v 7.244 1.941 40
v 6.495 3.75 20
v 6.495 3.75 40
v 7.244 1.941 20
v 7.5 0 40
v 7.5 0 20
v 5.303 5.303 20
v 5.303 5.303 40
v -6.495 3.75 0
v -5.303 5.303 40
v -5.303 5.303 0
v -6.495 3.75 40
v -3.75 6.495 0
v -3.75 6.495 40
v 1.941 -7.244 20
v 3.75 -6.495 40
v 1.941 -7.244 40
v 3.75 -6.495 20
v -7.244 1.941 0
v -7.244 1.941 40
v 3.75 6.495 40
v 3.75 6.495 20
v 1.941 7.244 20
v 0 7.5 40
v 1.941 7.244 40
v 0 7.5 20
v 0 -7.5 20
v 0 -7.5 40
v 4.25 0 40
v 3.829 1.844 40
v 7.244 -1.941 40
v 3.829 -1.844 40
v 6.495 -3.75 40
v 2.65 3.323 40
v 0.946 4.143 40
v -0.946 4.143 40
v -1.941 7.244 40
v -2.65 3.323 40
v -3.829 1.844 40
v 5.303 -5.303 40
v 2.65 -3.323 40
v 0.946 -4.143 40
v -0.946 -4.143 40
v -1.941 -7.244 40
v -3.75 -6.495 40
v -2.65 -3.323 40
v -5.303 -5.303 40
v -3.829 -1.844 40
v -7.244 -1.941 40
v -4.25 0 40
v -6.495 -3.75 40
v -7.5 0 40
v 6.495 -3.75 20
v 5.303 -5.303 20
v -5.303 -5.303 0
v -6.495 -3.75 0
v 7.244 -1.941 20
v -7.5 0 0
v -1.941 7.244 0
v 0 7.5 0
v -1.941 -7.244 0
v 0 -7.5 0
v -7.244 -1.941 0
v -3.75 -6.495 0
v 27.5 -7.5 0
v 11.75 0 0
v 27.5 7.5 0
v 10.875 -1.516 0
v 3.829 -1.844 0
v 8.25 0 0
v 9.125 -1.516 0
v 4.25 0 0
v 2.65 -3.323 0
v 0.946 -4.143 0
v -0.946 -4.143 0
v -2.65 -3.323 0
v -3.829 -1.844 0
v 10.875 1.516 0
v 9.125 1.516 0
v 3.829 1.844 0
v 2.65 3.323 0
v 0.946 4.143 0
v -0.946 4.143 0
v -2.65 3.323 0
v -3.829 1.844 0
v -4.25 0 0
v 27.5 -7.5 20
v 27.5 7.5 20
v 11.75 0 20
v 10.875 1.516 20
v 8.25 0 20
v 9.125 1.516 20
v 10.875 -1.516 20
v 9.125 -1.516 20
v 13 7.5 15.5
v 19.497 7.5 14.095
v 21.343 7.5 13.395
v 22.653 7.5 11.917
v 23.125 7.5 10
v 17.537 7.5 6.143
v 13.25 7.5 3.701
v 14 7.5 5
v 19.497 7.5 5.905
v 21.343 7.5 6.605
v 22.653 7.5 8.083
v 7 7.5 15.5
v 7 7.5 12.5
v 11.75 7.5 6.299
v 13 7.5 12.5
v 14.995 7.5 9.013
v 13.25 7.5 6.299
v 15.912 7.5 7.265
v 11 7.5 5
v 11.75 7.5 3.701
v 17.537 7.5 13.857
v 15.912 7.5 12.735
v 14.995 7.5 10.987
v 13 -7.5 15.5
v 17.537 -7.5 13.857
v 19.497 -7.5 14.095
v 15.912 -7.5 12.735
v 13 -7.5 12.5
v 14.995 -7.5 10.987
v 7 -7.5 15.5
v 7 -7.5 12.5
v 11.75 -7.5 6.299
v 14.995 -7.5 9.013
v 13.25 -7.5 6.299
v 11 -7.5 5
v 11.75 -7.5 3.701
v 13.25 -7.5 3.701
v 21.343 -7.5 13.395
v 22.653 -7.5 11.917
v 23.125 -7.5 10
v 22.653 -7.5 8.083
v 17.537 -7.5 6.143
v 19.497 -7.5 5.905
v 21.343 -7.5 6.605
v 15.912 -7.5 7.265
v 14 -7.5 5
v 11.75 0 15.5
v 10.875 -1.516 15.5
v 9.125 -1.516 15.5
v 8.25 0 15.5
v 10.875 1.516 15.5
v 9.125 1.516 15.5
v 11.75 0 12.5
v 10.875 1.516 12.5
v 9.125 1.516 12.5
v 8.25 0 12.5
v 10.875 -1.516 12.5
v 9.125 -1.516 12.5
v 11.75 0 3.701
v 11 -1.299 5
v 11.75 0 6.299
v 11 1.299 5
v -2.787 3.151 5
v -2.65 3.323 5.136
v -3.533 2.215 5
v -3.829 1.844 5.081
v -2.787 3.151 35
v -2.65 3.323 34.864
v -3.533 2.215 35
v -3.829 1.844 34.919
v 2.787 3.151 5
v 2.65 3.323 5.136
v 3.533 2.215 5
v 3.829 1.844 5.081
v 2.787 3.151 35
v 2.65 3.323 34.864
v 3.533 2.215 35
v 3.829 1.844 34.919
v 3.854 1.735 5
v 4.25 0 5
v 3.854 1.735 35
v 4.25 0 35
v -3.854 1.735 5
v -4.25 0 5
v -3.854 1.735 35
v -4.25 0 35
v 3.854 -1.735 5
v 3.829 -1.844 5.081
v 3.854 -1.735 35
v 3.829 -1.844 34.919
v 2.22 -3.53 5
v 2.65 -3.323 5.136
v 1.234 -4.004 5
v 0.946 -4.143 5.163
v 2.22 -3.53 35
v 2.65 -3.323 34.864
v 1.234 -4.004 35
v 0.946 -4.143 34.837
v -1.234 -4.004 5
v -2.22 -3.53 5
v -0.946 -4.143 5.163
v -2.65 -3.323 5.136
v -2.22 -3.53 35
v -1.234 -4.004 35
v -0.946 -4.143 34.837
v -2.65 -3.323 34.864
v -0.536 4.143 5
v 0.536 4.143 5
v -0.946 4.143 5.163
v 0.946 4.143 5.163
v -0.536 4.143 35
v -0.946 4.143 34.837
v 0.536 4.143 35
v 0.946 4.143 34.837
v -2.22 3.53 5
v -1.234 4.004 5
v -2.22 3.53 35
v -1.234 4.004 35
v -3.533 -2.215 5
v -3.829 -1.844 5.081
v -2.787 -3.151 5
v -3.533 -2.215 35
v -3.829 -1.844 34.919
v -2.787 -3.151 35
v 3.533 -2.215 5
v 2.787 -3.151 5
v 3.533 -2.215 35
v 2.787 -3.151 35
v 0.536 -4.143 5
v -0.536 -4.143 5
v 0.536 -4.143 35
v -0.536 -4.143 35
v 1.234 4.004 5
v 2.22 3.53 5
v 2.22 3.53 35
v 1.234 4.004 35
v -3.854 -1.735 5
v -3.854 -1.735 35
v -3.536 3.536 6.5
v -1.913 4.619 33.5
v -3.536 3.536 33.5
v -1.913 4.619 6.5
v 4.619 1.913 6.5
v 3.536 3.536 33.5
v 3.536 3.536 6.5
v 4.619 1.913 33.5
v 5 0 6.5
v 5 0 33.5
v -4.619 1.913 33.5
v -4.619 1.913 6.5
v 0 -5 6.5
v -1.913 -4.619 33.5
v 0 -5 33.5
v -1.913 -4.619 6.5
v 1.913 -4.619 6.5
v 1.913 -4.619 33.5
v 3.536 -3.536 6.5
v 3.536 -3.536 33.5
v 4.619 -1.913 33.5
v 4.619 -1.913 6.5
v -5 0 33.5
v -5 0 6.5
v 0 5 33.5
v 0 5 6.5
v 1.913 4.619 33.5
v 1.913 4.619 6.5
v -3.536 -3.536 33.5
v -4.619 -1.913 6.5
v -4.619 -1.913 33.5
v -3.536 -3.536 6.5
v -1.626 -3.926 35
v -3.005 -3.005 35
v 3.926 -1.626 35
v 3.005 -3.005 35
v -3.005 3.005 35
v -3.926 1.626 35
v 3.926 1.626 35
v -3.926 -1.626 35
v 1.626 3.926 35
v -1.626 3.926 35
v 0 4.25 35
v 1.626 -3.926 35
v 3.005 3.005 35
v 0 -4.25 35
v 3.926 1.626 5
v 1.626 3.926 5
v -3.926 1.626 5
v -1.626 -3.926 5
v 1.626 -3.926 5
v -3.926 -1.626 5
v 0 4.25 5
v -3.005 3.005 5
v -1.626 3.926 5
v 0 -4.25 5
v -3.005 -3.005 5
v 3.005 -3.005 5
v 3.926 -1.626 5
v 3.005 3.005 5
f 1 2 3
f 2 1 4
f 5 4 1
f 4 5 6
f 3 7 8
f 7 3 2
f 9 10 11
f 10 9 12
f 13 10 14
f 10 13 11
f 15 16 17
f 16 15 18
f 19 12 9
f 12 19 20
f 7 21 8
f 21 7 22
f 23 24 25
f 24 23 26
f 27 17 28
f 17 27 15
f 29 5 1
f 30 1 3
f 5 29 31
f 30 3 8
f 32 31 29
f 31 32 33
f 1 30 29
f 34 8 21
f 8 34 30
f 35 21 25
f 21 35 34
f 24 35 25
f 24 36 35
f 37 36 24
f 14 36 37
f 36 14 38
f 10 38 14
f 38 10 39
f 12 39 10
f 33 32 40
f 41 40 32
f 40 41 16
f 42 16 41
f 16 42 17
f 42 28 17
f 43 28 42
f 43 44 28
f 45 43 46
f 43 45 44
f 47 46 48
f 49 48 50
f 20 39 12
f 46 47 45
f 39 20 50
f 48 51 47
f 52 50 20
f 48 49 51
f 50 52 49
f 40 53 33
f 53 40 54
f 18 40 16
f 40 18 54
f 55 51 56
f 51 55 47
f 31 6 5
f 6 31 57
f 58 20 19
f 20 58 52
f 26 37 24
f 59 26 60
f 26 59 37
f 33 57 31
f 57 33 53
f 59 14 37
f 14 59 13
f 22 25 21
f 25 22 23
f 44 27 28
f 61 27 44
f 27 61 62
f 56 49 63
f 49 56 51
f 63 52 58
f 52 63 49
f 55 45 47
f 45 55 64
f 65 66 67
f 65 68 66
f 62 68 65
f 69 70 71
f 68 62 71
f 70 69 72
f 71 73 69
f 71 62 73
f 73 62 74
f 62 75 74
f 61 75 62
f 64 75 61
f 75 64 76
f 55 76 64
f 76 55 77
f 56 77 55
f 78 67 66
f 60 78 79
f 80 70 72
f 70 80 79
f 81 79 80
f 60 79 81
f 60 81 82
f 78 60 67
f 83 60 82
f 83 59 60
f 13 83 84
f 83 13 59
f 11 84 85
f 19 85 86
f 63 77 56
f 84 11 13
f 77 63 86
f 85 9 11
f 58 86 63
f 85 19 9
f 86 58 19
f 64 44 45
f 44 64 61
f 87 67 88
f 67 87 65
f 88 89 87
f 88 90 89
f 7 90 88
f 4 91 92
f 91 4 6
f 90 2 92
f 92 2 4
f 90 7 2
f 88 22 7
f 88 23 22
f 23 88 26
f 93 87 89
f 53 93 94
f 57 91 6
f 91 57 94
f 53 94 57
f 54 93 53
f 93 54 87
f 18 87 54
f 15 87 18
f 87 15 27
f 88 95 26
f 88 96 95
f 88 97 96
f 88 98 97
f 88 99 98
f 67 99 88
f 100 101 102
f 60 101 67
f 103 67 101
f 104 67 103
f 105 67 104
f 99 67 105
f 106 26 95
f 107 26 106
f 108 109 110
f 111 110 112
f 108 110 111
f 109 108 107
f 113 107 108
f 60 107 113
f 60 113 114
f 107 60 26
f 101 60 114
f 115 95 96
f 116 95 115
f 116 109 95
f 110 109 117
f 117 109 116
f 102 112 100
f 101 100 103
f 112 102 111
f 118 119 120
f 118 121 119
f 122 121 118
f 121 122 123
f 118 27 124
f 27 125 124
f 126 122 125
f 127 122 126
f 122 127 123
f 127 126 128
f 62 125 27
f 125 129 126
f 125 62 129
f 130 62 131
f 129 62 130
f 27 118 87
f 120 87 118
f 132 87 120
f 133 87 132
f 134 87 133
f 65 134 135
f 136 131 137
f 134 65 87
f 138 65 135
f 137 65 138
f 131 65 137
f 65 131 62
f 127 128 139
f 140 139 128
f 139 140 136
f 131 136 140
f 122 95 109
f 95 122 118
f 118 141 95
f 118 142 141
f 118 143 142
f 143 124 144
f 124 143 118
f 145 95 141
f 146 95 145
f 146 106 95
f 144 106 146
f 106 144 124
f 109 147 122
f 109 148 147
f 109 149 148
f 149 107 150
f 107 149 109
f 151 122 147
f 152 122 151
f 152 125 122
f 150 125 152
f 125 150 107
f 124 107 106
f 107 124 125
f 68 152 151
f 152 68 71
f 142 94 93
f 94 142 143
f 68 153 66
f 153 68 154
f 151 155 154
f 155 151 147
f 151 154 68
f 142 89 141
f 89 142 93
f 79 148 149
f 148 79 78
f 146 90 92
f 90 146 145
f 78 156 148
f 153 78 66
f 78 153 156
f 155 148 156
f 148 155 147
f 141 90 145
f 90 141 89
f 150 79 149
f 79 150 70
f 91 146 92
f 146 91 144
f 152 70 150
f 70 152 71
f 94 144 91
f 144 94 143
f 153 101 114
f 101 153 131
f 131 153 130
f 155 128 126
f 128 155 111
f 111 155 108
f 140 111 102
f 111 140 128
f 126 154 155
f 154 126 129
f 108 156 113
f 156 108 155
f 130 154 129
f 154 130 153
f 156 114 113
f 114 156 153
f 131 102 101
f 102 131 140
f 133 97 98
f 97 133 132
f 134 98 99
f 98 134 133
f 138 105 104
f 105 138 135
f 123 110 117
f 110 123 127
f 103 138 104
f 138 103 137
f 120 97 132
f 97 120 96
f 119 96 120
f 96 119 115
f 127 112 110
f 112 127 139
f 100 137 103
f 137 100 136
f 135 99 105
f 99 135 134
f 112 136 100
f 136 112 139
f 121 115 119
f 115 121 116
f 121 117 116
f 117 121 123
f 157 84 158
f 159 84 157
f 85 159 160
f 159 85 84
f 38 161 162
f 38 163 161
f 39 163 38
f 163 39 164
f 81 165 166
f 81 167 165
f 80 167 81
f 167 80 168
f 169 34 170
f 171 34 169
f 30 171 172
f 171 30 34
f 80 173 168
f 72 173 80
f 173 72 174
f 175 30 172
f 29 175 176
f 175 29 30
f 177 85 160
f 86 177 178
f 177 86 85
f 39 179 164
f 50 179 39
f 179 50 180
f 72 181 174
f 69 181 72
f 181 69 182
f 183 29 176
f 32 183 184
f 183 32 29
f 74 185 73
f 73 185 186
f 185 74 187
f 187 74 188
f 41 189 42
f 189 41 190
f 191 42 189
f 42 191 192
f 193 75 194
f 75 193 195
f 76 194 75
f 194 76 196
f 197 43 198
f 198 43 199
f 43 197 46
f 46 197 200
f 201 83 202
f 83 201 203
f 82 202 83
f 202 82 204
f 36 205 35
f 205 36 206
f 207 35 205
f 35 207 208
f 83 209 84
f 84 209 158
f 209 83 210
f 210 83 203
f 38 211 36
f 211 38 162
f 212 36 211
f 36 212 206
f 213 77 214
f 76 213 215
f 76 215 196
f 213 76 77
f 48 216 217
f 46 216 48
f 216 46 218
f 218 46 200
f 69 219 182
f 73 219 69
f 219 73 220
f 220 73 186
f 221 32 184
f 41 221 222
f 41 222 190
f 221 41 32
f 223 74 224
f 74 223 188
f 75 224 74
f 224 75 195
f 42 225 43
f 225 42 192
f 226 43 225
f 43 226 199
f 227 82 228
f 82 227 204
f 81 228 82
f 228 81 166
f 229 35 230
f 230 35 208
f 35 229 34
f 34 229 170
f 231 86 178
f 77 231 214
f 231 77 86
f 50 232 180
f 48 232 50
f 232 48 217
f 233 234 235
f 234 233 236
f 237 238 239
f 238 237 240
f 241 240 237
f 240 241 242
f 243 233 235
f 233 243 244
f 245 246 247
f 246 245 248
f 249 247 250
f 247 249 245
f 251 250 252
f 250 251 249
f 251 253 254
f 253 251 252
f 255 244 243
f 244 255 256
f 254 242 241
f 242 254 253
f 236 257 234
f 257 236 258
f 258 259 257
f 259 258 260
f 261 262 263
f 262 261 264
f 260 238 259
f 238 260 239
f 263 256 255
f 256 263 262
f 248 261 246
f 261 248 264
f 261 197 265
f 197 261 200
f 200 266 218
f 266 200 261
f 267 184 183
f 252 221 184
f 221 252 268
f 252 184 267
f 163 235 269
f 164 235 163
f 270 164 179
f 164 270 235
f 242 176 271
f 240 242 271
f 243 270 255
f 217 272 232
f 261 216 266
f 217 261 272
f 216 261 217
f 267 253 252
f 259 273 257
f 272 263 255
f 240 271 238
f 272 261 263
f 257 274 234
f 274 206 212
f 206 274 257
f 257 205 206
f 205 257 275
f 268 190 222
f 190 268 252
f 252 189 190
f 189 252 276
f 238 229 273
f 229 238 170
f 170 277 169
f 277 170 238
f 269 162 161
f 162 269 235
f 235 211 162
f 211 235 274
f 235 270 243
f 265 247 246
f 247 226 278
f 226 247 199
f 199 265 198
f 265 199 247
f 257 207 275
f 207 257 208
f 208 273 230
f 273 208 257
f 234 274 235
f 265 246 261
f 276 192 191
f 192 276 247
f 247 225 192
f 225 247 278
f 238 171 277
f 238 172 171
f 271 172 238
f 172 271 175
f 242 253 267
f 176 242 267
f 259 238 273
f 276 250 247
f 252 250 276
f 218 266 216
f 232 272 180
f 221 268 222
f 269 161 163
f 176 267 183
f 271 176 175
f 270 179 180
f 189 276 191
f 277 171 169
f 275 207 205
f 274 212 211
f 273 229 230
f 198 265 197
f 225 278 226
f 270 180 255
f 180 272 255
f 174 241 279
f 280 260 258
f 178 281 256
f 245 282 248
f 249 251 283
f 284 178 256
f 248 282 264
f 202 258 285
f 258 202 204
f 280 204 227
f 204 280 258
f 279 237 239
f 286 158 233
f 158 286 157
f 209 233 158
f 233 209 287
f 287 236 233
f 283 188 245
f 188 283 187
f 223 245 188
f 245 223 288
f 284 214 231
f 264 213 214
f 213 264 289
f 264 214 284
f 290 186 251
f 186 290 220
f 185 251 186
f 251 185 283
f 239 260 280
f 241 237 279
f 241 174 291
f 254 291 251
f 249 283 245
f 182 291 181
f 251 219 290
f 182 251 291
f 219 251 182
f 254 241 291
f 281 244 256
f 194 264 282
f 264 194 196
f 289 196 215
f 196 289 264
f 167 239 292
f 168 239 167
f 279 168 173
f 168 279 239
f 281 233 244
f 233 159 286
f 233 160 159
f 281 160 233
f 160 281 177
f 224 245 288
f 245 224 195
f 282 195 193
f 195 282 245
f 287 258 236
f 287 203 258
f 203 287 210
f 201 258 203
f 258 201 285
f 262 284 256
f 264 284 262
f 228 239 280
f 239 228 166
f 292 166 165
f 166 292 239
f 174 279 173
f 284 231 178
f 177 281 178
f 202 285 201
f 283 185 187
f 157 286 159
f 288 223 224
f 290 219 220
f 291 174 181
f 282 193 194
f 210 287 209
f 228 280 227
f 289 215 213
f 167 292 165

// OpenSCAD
epsilon=0.1;


difference() {
    union() {
        cylinder(d=15,h=40);
        translate([0,-7.5])
            cube([27.5,15,20]);
    }
    
    // Adjuster
    translate([10-3,-7.5-epsilon,12.5])
        cube([6,15+2*epsilon,3]);
    translate([10,0,-epsilon])
        cylinder(d=3.5, h=20+2*epsilon,$fn=6);
    
    // Stationary Hole
    translate([12.5,7.5+epsilon,5])
        rotate([90,0,0])
            cylinder(d=3, h=15+2*epsilon,$fn=6);
    
    // Across
    translate([19,7.5+epsilon,10])
        rotate([90,0,0])
            cylinder(d=8+0.25, h=15+2*epsilon);
    
    // Bearing
    translate([0,0,-epsilon])
        cylinder(d=8.5,h=40+2*epsilon);
    translate([0,0,6.5])
        cylinder(d=10,h=40-3-10);
    translate([0,0,40-1.5-5])
        cylinder(d1=10,d2=8.5,h=1.5);
    translate([0,0,5])
        cylinder(d1=8.5,d2=10,h=1.5);
}
